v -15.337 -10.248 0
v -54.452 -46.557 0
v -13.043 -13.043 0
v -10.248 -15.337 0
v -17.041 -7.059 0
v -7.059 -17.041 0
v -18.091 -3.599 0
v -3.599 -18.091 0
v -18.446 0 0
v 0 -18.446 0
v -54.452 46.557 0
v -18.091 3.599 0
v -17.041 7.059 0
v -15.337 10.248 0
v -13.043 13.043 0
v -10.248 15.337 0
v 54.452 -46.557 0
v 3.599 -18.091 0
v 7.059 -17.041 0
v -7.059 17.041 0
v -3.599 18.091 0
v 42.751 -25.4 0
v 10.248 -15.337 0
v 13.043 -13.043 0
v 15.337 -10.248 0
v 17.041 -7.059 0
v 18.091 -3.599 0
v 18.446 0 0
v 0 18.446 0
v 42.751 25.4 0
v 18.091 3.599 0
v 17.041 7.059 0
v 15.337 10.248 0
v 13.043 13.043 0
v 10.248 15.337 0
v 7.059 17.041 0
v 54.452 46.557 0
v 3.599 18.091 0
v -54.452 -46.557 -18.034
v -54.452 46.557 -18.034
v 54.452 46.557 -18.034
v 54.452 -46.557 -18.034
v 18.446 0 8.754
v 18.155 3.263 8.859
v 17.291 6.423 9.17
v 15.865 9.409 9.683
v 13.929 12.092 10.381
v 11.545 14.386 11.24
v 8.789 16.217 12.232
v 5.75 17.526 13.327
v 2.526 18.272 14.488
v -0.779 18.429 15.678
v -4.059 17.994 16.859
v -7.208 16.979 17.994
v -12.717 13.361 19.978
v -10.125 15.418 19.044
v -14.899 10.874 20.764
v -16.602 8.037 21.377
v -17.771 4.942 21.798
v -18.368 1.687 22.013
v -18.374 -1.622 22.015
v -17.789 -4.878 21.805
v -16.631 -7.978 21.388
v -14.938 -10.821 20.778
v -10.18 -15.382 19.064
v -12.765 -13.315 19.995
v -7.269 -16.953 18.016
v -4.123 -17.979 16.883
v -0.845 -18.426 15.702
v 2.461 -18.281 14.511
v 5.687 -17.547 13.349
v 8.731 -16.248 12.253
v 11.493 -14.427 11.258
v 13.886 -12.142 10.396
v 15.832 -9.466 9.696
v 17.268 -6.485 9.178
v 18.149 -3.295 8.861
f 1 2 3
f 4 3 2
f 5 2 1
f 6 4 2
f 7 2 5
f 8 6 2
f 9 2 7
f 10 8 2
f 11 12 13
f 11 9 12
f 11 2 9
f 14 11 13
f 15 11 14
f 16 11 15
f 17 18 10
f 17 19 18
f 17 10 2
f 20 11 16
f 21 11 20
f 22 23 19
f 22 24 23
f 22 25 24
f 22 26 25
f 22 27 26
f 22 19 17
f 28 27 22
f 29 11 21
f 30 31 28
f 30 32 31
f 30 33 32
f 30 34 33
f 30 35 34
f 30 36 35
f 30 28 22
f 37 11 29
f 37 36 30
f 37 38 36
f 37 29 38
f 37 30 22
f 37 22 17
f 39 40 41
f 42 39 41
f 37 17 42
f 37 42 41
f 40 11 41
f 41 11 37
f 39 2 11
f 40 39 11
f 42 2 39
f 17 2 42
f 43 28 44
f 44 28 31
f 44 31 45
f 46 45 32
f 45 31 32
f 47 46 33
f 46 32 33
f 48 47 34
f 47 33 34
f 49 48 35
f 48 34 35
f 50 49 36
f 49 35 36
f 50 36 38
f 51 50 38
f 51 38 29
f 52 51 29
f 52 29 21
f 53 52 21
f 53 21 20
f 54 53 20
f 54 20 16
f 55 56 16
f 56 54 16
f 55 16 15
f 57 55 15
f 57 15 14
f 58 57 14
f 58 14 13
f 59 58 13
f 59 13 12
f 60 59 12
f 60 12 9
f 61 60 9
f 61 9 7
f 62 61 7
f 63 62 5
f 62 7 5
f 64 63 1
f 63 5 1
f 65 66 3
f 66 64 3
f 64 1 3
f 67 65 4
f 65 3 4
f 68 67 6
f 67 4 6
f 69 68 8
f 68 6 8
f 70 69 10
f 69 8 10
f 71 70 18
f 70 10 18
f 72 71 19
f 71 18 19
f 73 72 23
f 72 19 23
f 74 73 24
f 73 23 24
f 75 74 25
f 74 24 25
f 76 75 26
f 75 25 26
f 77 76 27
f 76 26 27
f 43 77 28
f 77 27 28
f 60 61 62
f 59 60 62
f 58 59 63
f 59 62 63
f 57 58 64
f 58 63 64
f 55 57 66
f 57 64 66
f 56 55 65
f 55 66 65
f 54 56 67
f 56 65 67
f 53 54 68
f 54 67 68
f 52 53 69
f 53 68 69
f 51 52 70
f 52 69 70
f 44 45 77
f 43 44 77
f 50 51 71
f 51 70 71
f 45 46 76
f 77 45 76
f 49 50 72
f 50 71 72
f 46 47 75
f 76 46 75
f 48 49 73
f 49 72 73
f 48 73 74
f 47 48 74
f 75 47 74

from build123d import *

# Parameters (mm, degrees)
F0_W     = 108.90334
F0_H     = 93.113952
F1_DEPTH = 18.034
F2_R     = 18.445574
F3_DEPTH = 54.61
F5_DEPTH = 25.4


with BuildPart() as f1:
    # F0 (on Top) → F1 (new body)
    with BuildSketch(Plane.XY):
        Rectangle(F0_W, F0_H)
    extrude(amount=-F1_DEPTH)

    # F2 (on Top) → F3 (join)
    with BuildSketch(Plane.XY):
        Circle(F2_R)
    extrude(amount=F3_DEPTH)

    # F4 (on Front) → F5 (cut, symmetric)
    with BuildSketch(Plane.XZ):
        Polygon((-27.631808, 92.519648), (-27.631808, 25.349762), (42.751096, 0), (42.751096, 25.349762), (42.751096, 92.519648), align=None)
    extrude(amount=F5_DEPTH, both=True, mode=Mode.SUBTRACT)


solid = f1.part
